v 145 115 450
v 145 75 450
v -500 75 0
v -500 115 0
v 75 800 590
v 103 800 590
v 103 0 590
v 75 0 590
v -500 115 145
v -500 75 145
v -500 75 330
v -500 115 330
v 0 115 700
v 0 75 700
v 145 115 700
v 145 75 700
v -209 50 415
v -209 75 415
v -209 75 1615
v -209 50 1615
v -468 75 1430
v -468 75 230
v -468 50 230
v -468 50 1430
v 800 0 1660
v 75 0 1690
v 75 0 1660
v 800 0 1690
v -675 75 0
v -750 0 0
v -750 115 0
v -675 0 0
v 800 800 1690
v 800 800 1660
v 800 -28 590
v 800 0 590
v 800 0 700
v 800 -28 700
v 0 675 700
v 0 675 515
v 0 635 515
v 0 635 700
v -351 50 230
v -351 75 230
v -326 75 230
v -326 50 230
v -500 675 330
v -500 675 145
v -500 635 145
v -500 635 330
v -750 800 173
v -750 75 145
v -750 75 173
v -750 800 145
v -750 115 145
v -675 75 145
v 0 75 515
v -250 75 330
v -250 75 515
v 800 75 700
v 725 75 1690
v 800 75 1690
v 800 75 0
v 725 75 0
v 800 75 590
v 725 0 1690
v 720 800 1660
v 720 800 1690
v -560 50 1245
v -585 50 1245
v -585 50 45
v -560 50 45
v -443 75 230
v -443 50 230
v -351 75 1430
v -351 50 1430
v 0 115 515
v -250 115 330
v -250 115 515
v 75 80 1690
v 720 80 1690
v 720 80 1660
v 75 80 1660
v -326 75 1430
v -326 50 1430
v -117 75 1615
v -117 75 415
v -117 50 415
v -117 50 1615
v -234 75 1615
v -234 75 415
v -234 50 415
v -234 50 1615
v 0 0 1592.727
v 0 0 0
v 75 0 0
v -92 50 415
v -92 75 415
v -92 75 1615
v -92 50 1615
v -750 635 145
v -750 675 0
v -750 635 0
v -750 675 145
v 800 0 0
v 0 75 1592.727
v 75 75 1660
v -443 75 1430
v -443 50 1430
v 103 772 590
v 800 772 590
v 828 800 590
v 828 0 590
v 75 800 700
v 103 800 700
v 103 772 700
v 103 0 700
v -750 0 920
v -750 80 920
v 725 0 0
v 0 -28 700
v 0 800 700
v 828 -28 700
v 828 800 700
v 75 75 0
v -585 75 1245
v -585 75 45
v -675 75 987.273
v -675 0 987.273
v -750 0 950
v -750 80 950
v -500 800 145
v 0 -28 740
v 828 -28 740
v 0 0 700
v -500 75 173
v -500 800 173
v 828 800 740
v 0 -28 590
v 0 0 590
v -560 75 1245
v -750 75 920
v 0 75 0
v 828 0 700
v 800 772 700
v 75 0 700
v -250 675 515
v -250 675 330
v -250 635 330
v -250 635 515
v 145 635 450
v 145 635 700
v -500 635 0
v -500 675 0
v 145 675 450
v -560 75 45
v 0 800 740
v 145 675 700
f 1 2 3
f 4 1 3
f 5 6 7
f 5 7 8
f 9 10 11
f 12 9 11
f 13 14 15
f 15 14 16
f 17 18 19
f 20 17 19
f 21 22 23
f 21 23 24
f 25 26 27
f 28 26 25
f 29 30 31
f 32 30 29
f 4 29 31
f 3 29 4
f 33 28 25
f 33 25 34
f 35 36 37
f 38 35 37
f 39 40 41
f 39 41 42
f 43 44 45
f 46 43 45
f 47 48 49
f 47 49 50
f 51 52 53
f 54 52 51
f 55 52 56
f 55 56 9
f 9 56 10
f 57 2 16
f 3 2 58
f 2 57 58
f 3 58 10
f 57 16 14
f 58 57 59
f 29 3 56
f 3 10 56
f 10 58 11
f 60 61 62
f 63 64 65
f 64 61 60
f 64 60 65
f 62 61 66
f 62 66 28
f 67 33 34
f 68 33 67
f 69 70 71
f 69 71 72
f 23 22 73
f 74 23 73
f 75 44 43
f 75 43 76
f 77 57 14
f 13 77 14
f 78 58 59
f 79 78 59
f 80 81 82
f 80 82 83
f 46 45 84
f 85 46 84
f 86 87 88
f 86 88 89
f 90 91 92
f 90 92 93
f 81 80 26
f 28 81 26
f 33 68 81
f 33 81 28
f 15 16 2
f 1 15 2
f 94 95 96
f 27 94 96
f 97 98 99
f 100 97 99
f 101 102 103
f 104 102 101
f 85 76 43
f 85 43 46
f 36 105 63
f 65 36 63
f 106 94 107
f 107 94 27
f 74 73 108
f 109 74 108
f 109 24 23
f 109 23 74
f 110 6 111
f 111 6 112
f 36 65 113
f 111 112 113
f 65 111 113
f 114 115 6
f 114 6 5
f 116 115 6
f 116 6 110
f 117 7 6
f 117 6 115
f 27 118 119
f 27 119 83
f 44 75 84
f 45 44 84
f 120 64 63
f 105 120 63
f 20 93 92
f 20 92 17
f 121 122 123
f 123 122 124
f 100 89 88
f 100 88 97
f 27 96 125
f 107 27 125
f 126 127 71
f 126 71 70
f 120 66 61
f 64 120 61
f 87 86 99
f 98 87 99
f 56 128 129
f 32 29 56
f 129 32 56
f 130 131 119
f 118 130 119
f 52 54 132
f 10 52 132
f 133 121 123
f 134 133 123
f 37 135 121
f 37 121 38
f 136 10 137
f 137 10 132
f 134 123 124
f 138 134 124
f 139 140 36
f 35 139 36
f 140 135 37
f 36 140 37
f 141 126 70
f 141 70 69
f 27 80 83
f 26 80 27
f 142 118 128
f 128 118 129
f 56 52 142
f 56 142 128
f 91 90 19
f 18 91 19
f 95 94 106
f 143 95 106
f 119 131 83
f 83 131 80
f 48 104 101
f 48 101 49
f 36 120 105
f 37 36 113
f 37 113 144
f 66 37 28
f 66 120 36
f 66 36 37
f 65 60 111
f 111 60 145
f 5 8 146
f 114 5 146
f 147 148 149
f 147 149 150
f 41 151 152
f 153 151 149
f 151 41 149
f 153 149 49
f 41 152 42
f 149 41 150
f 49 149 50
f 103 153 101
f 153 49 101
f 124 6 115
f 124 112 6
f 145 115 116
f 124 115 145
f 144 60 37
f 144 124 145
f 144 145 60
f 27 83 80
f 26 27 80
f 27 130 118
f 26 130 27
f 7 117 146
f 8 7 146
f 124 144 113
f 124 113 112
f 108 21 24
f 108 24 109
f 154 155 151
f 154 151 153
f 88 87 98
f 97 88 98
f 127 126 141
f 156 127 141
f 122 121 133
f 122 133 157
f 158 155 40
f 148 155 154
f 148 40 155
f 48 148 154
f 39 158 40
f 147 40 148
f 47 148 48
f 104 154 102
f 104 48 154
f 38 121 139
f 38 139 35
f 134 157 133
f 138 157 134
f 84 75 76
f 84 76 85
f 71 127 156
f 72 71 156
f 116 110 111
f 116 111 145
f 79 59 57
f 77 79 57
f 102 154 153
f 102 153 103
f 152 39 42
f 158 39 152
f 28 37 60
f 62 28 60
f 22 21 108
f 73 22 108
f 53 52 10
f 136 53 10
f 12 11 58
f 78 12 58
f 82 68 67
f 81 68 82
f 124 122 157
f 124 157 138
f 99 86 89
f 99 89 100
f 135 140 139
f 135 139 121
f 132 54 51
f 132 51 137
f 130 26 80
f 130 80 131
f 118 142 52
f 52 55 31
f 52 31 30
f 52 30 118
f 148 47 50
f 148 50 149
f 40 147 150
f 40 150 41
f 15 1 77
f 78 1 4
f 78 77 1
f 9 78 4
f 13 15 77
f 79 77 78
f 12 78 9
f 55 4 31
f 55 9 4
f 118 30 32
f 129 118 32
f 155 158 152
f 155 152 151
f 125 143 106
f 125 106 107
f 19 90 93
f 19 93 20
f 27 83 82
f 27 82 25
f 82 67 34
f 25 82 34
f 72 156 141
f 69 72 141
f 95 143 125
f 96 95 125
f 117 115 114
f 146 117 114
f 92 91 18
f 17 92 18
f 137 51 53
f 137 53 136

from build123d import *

# Parameters (mm, degrees)
F0_W      = 75
F0_H      = 75
F1_DEPTH  = 1690
F2_W      = 800
F2_H      = 110
F3_DEPTH  = 28
F4_W      = 800
F4_H      = 110
F5_DEPTH  = 28
F6_W      = 28
F6_H      = 110
F7_DEPTH  = 800
F8_W      = 28
F8_H      = 110
F9_DEPTH  = 697
F10_W     = 828
F10_H     = 828
F11_DEPTH = 40
F15_DEPTH = 40
F17_W     = 75
F17_H     = 75
F18_DEPTH = 1000
F20_DEPTH = 75
F22_DEPTH = 80
F24_DEPTH = 800.001
F25_W     = 25
F25_H     = 1200
F26_DEPTH = 25
F28_DEPTH = 30
F29_W     = 250
F29_H     = 725
F30_DEPTH = 28


with BuildPart() as f1:
    # F0 (on Top) → F1 (new body)
    with BuildSketch(Plane.XY):
        with Locations((37.5, 37.5)):
            Rectangle(F0_W, F0_H)
    extrude(amount=F1_DEPTH)

    # F23 (on face) → F24 (cut, through all)
    with BuildSketch(Plane.XZ):
        Polygon((0, 1690), (0, 1592.7272727273), (75, 1660), (75, 1690), align=None)
    extrude(amount=-F24_DEPTH, mode=Mode.SUBTRACT)


with BuildPart() as f1b:
    # F0 (on Top) → F1, piece 2 (new body)
    with BuildSketch(Plane.XY):
        with Locations((762.5, 37.5)):
            Rectangle(F0_W, F0_H)
    extrude(amount=F1_DEPTH)

    # F4 (on face) → F5 (join)
    with BuildSketch(Plane.YZ.offset(800)):
        with Locations((400, 645)):
            Rectangle(F4_W, F4_H)
    extrude(amount=F5_DEPTH)

    # F8 (on face) → F9 (join, through all)
    with BuildSketch(Plane(origin=(800, 0, 0), x_dir=(0, -1, 0), z_dir=(-1, 0, 0))):
        with Locations((-786, 645)):
            Rectangle(F8_W, F8_H)
    extrude(amount=F9_DEPTH)


with BuildPart() as f3:
    # F2 (on face) → F3 (new body)
    with BuildSketch(Plane.XZ):
        with Locations((400, 645)):
            Rectangle(F2_W, F2_H)
    extrude(amount=F3_DEPTH)


with BuildPart() as f7:
    # F6 (on face) → F7 (new body, through all)
    with BuildSketch(Plane(origin=(0, 0, 0), x_dir=(-1, 0, 0), z_dir=(0, 1, 0))):
        with Locations((-89, 645)):
            Rectangle(F6_W, F6_H)
    extrude(amount=F7_DEPTH)


with BuildPart() as f11:
    # F10 (on face) → F11 (new body)
    with BuildSketch(Plane.XY.offset(700)):
        with Locations((414, 386)):
            Rectangle(F10_W, F10_H)
    extrude(amount=F11_DEPTH)


with BuildPart() as f15:
    # F14 (on offset) → F15 (new body)
    with BuildSketch(Plane(origin=(0, 75, 0), x_dir=(-1, 0, 0), z_dir=(0, 1, 0))):
        Polygon((0, 700), (-145, 700), (-145, 450), (500, 0), (750, 0), (750, 145), (500, 145), (500, 330), (250, 330), (250, 515), (0, 515), align=None)
    extrude(amount=F15_DEPTH)


with BuildPart() as f16_1:
    # F16: instance of F15
    add(f15.part.mirror(Plane(origin=(37.5, 375, 845), x_dir=(-1, 0, 0), z_dir=(0, 1, 0))))


with BuildPart() as f15_1:
    add(f15.part)

    # F17 (on face) → F18 (join)
    with BuildSketch(Plane(origin=(0, 0, 0), x_dir=(1, 0, 0), z_dir=(0, 0, -1))):
        with Locations((-712.5, -37.5)):
            Rectangle(F17_W, F17_H)
    extrude(amount=-F18_DEPTH)

    # F19 (on face) → F20 (cut, through all)
    with BuildSketch(Plane.XZ):
        Polygon((-750, 1000), (-750, 920), (-675, 987.2727272727), (-675, 1000), align=None)
    extrude(amount=-F20_DEPTH, mode=Mode.SUBTRACT)


with BuildPart() as f22:
    # F21 (on face) → F22 (new body)
    with BuildSketch(Plane.XZ):
        Polygon((75, 1690), (-750, 950), (-750, 920), (75, 1660), align=None)
    extrude(amount=-F22_DEPTH)


with BuildPart() as f26:
    # F25 (on face) → F26 (new body)
    with BuildSketch(Plane.XZ.offset(-75)):
        with Locations((-338.5, 830)):
            Rectangle(F25_W, F25_H)
    extrude(amount=F26_DEPTH)


with BuildPart() as f26b:
    # F25 (on face) → F26, piece 2 (new body)
    with BuildSketch(Plane.XZ.offset(-75)):
        with Locations((-221.5, 1015)):
            Rectangle(F25_W, F25_H)
    extrude(amount=F26_DEPTH)


with BuildPart() as f26c:
    # F25 (on face) → F26, piece 3 (new body)
    with BuildSketch(Plane.XZ.offset(-75)):
        with Locations((-104.5, 1015)):
            Rectangle(F25_W, F25_H)
    extrude(amount=F26_DEPTH)


with BuildPart() as f26d:
    # F25 (on face) → F26, piece 4 (new body)
    with BuildSketch(Plane.XZ.offset(-75)):
        with Locations((-455.5, 830)):
            Rectangle(F25_W, F25_H)
    extrude(amount=F26_DEPTH)


with BuildPart() as f26e:
    # F25 (on face) → F26, piece 5 (new body)
    with BuildSketch(Plane.XZ.offset(-75)):
        with Locations((-572.5, 645)):
            Rectangle(F25_W, F25_H)
    extrude(amount=F26_DEPTH)


with BuildPart() as f28:
    # F27 (on face) → F28 (new body)
    with BuildSketch(Plane.XY.offset(1690)):
        Polygon((800, 800), (720, 800), (720, 80), (75, 80), (75, 0), (725, 0), (800, 0), align=None)
    extrude(amount=-F28_DEPTH)


with BuildPart() as f30:
    # F29 (on face) → F30 (new body)
    with BuildSketch(Plane.XY.offset(145)):
        with Locations((-625, 437.5)):
            Rectangle(F29_W, F29_H)
    extrude(amount=F30_DEPTH)


solid = Compound([f1.part, f1b.part, f3.part, f7.part, f11.part, f16_1.part, f15_1.part, f22.part, f26.part, f26b.part, f26c.part, f26d.part, f26e.part, f28.part, f30.part])
